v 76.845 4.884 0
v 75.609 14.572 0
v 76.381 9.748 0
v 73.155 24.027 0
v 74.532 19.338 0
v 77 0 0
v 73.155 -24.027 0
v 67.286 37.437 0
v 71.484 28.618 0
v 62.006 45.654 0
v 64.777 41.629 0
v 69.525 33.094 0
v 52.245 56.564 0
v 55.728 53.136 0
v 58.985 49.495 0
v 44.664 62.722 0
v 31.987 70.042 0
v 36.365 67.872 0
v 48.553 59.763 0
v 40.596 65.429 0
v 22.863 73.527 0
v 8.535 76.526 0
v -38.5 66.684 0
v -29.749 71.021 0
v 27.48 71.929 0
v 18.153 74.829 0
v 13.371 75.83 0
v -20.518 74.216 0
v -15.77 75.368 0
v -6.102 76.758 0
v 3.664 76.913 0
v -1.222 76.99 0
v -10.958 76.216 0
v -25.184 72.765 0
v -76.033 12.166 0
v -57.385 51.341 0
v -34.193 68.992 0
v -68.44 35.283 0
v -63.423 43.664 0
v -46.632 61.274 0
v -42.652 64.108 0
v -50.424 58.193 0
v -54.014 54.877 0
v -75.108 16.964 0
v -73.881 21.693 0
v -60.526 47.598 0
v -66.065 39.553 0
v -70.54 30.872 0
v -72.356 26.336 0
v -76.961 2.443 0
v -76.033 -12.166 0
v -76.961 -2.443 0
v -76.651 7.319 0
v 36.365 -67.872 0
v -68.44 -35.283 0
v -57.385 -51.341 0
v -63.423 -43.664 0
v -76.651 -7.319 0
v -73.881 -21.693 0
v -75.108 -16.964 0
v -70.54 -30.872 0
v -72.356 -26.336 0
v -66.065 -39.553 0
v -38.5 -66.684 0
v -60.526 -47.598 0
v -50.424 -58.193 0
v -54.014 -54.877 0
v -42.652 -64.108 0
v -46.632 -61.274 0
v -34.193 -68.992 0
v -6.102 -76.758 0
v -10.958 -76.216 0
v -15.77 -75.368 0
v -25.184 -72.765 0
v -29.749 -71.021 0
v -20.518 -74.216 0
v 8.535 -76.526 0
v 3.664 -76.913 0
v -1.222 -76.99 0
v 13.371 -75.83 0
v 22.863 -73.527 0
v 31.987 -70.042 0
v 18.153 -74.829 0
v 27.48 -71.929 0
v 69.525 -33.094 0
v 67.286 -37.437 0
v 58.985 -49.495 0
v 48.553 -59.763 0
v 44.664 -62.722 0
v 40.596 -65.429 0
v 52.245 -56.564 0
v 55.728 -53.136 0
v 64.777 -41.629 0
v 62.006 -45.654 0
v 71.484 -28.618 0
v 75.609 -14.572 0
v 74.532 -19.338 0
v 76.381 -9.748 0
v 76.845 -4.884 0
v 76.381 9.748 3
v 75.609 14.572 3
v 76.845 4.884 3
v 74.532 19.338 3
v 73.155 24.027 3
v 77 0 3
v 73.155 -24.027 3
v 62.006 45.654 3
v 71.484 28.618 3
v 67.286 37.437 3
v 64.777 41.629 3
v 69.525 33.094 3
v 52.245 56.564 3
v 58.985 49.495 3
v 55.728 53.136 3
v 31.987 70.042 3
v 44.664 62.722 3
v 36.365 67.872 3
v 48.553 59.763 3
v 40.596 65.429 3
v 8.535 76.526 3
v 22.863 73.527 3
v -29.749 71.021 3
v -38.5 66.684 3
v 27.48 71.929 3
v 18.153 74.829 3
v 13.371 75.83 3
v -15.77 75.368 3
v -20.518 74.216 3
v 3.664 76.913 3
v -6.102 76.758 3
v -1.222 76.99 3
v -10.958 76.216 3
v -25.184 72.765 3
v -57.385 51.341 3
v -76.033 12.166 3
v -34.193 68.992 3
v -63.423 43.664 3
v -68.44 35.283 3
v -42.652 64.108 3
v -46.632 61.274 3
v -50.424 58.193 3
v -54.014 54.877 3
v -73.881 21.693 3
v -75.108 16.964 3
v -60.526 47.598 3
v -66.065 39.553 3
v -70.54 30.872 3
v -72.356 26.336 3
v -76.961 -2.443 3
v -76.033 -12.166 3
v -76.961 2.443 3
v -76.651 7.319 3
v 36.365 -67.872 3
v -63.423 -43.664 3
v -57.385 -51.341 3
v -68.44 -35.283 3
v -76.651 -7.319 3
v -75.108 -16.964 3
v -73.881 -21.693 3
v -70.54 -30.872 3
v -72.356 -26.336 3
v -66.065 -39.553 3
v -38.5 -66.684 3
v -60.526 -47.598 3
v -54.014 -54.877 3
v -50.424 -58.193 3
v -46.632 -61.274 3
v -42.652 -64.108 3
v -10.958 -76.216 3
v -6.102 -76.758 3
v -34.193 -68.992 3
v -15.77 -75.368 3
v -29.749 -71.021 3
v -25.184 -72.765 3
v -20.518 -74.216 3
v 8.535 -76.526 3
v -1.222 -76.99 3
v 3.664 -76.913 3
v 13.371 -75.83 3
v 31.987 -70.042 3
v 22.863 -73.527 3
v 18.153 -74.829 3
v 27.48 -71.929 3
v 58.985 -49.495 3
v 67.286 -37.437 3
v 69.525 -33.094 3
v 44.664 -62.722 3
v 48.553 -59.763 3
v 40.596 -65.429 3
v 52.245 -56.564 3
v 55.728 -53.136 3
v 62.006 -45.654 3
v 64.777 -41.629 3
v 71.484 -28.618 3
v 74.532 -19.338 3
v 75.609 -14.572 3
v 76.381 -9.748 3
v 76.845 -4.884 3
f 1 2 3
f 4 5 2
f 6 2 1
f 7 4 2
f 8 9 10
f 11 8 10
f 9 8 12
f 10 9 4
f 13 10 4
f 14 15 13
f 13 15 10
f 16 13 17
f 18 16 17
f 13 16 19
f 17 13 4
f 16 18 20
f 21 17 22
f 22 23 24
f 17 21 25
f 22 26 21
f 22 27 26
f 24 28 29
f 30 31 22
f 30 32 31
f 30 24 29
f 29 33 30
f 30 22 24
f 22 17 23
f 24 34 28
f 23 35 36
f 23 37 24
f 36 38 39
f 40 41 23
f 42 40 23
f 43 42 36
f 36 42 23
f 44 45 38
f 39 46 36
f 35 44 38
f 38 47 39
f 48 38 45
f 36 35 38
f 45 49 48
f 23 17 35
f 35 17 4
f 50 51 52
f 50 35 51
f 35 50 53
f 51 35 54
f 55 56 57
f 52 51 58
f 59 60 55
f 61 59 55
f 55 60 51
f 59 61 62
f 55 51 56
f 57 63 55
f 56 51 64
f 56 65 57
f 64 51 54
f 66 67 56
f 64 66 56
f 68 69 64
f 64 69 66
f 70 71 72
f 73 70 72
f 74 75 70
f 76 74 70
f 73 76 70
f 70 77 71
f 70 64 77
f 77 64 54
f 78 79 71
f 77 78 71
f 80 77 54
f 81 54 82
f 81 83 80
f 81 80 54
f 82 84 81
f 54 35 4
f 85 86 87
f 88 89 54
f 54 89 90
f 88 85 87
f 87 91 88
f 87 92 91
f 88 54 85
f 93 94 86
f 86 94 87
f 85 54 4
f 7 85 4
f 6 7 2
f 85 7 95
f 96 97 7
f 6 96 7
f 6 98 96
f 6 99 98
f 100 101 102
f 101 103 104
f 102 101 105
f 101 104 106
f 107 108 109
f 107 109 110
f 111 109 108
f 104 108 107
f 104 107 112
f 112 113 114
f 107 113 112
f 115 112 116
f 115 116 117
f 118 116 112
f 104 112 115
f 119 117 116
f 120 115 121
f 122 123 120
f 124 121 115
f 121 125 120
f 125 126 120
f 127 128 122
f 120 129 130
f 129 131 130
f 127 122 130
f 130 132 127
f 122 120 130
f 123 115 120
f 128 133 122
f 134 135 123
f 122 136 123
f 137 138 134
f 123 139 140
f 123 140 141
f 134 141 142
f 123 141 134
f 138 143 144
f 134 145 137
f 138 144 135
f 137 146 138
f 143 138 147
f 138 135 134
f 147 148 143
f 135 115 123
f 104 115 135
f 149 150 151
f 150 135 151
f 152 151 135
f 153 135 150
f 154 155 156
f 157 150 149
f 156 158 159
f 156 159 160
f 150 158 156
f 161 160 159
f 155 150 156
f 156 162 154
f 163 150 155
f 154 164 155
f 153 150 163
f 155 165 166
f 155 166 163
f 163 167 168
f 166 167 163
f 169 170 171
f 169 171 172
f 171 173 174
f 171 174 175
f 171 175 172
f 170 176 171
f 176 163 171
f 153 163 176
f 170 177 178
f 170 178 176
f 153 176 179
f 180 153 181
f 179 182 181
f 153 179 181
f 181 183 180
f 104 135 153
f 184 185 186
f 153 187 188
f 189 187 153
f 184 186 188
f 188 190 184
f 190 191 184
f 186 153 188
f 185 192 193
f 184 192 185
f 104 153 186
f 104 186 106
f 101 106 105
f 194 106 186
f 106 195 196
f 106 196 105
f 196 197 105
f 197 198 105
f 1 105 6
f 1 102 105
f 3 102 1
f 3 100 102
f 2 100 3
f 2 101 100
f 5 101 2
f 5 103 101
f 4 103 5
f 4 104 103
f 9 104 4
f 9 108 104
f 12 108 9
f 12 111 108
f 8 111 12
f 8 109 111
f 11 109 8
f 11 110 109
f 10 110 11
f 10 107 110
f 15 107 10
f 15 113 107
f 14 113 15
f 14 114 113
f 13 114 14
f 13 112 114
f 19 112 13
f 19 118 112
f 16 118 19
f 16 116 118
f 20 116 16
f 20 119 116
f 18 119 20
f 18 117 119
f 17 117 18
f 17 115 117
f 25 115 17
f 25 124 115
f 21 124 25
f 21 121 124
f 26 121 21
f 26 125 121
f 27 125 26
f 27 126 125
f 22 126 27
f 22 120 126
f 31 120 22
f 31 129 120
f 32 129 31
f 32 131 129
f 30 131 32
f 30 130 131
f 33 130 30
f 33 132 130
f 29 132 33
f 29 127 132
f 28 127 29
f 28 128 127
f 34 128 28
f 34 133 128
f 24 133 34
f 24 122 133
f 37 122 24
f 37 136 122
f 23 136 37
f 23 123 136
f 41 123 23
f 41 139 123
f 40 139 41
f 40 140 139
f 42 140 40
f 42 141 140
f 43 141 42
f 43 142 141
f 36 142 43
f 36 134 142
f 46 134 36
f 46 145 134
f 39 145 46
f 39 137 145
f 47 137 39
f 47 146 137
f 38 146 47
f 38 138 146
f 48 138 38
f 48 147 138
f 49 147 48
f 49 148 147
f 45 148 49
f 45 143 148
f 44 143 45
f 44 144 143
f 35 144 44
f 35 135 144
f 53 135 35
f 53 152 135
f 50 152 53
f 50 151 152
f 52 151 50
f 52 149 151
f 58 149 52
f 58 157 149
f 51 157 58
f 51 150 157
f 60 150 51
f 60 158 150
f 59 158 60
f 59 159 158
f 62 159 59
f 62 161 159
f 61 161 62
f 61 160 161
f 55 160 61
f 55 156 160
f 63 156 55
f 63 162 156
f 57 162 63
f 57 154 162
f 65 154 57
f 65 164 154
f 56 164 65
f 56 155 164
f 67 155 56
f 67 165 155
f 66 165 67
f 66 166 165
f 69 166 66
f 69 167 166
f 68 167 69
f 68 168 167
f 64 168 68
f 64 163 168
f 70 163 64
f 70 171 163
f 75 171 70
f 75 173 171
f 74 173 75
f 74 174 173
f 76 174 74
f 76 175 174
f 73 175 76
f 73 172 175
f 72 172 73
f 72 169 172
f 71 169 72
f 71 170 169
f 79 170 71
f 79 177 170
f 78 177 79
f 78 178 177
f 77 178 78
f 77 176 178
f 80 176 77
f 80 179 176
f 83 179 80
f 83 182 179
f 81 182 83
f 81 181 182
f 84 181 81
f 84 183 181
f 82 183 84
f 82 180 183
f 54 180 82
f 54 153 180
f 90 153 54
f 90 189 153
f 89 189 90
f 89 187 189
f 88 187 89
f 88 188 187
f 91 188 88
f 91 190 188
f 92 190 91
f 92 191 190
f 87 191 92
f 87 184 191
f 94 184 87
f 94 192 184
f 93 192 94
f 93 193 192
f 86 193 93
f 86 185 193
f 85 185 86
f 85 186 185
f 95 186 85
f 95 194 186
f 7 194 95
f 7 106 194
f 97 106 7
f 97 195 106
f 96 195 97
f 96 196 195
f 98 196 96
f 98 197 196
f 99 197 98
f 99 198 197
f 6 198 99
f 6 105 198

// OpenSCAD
//// Impossible (not really) Ring with lots of features and options.
//
// TODO:
//
// - Either top and bottom sizes, or array (to allow for in/out taper)
//
// - Magnet option chooser (add model numbers):
//   - Small
//	 - Medium
//   - Large
//   - Custom
// - Separator shape
//
// - Related way to create a "wall"
// - Related way to create rounded rectangle
//
// Some useful presets:
// * Ring that fits a soda can: 5, 45, 45, 10, 3, 22, 16
//
// * Small diametric magnet: 14.0, 3.5, 2.0, 0.8 -- for _RingInset = 12
// * Large diametric magnet: 14.0, 7.0, 2.0, 0.8 -- for _RingInset = 19
//
// The [Extruders] parameters work as follows:
//
//	* WhichExtruder controls on-screen and STL rendering. Set it to All while
//	  designing. To render STL, set it successively to 1, 2, 3, 4, and 5 then
//	  render (F6) and save (F7) to numbered files (perhaps append "_1", "_2",
//	  and so forth to the base names. 
//
//	* BaseExtruder sets the extruder for the round or semicircular base.
//
//	* RingExtruder sets the extruder for the rings.
//
//	* SeparatorExtruders sets the extruder(s) for the vertical separators 
//    between the rings.
//
//  * SeparatorExtruderMode sets the extruder selection mode:
//
//		Horizontal - Each row of the ring has a single extruder setting, cycling through
//	    the list of SeparatorExtruder values.
//
//		Vertical - Each column of separators has a single extruder setting, cycling
//	    through the list fo SeparatorExtruder values.
//
// BUGS:
//
// * Expanding rings (wider at top than bottom), the separators are one Z level too low. Tilt is 
//   miscalculated when the triangle is pointing out, perhaps subtract 180? This is currently
//   disabled via an assert.
//
// * The inner edge of tilted separators hangs out a bit to the inside of each ring, 
//   causing printing problems. Perhaps render the entire thing and subtract the space inside of 
//   each ring to clear it (except first one if there's a solid bottom). Or, flatten out the 
//   inside part of each separator.
//
// TO TEST / IMPLEMENT:
//
// * Full expanding rings
// * Partial expanding rings
// * Full contracting rings
// * Partial contracting rings
// * Vertical (same size top and bottom) rings
//

// Ring count
_LayerCount = 1;

// Bottom ring radius
_BottomRingRadius = 77;

// Top ring radius
_TopRingRadius = 47;

// Ring inset
_RingInset = 14;

// Ring thickness
_RingThickness = 3;

// Separator height
_SeparatorHeight = 30;

// Separator count
_SeparatorCount = 16;

/* [Options] */

// Solid base
_SolidBase = true;

// Partial ring
_PartialRing = false;

// Magnet slots
_MagnetSlots = false;

/* [Partial] */

// Starting degrees
_StartRing = 0;

// Ending degrees
_EndRing = 360;

/* [Magnets] */

// Magnet angles
_MagnetAngles = [0, 0, 0, 0];

// Slot height
_MagnetSlotHeight = 14.0;

// Slot width/depth
_MagnetWidthDepth = 7; // 3.5;

// Height above base of separator
_MagnetHeight = 2.0;

// Inset from mid-point of separator
_MagnetInset = 0.8;

/* [Extruders] */

// Extruder to render
_WhichExtruder = "All"; // ["All", 1, 2, 3, 4, 5]

// Base extruder
_BaseExtruder = 1; 			// [1, 2, 3, 4, 5]

// Ring extruder
_RingExtruder = 1;			// [1, 2, 3, 4, 5]

// Separator extruder mode
_SeparatorExtruderMode = "Horizontal";	// [Horizontal, Vertical]

// Separator extruder 1
_SeparatorExtruder1 = true;

// Separator extruder 2
_SeparatorExtruder2 = true;

// Separator extruder 3
_SeparatorExtruder3 = true;

// Separator extruder 4
_SeparatorExtruder4 = true;

// Separator extruder 5
_SeparatorExtruder5 = true;

// Sanity checks
assert(_SeparatorHeight > (_MagnetHeight + _MagnetSlotHeight), "Magnet too tall");
assert(_TopRingRadius <= _BottomRingRadius, "Expanding rings don't work");

// Create _SeparatorExtruders vector from individual values, then use it to create _SeparatorExtruders
_SeparatorExtrudersVec = [false, _SeparatorExtruder1, _SeparatorExtruder2, _SeparatorExtruder3, _SeparatorExtruder4, _SeparatorExtruder5];
_SeparatorExtruders    = [for (i = [0 : 5]) if (_SeparatorExtrudersVec[i]) i];

// Map row and column of separator into an extruder, based on _SeparatorExtruderMode
function PickSeparatorExtruder(Row, Col) =
 (_SeparatorExtruderMode == "Horizontal") ? _SeparatorExtruders[floor(Row % len(_SeparatorExtruders))] :
 (_SeparatorExtruderMode == "Vertical")   ? _SeparatorExtruders[floor(Col % len(_SeparatorExtruders))] : 
 -1;	// Illegal value for _SeparatorExtruderMode

// Map a value of _WhichExtruder to an OpenSCAD color
function ExtruderColor(Extruder) = 
  (Extruder == 1  ) ? "red"    : 
  (Extruder == 2  ) ? "green"  : 
  (Extruder == 3  ) ? "blue"   : 
  (Extruder == 4  ) ? "pink"   :
  (Extruder == 5  ) ? "yellow" :
                      "purple" ;
					  
// If _WhichExtruder is "All" or is not "All" and matches the requested extruder, render 
// the child nodes.

module Extruder(DoExtruder)
{
	color(ExtruderColor(DoExtruder))
	{
		if (_WhichExtruder == "All" || DoExtruder == _WhichExtruder)
		{
			children();
		}
	}
}

// Render a ring
module RenderRing(Radius, Inset, Thickness)
{
	linear_extrude(Thickness)
	{
		difference()
		{
			circle(r=Radius, $fn=99);
			
			if (Inset != 0)
			{
				circle(r=Radius - Inset, $fn=99);
			}
		}
	}
}

// Render a single separator
//	Height is the vertical spacing between rings
//	Length is the commputed length of the separator, taking tilt in to account
//
module RenderSeparator(Extruder, Radius, Height, Length)
{
	Extruder(Extruder)
	{
		linear_extrude(Length)
		{
			circle(r=Radius, $fn=99);
		}
	}
}

// Render a magnet hole centered horizontally within a separator of size SeparatorRadius
module RenderMagnetHole(SeparatorRadius, SlotHeight, WidthDepth, Height, Inset)
{
	translate([0, Inset + WidthDepth / 2, Height + SlotHeight / 2])
	{
		cube([WidthDepth, WidthDepth, SlotHeight], center=true);
	}
}

// Render a single separator with a magnet hole
module RenderSeparatorWithMagnetHole(Extruder, Radius, Height, MagnetSlotHeight, MagnetWidthDepth, MagnetHeight, MagnetInset)
{
	difference()
	{
		// Matter
		RenderSeparator(Extruder, Radius, Height);
		
		// Anti-matter
		RenderMagnetHole(Radius, MagnetSlotHeight, MagnetWidthDepth, MagnetHeight, MagnetInset);
	}
}

// Render entire ring of separators with optional magnet holes at the specified angles
module RenderSeparators(Row, Count, Radius, RingThickness, Inset, Height, Length, Tilt, MagnetSlots, MagnetAngles, MagnetSlotHeight, MagnetWidthDepth, MagnetHeight, MagnetInset)
{
	for (Col = [0 : Count - 1])
	{
		Theta  = Col * 360 / Count;
		PointX = cos(Theta) * (Radius - (Inset / 2));
		PointY = sin(Theta) * (Radius - (Inset / 2));
		
		Extruder = PickSeparatorExtruder(Row, Col);
		
		translate([PointX, PointY, -RingThickness])
		{
			MagnetHere = MagnetSlots && (len(search(Theta, MagnetAngles)) > 0);
					
			// Handle separators with and without magnets separately	
			if (MagnetHere)
			{
				echo("Need a magnet at ", Theta);
				
				// Does not work for 270, but 90 and 180 are the most important cases
				SeparatorRotate = (Theta == 90)  ? -90 : 
				                  (Theta == 180) ? 180 : 0;

				rotate([0, -Tilt, Theta])
				{
					rotate([0, 0, SeparatorRotate])
					{
						RenderSeparatorWithMagnetHole(Extruder, Inset / 2, Length, MagnetSlotHeight, MagnetWidthDepth, MagnetHeight, MagnetInset);
					}
				}
			}
			else
			{
				rotate([0, -Tilt, Theta])
				{
					RenderSeparator(Extruder, Inset / 2, Height, Length);
				}
			}
		}
	}
}

//
// Render entire ring of separators inside of a clipping box. 
// The box removes the parts of the separator that extend above or below the rings.
//
module RenderSeparatorsInBox(Row, Count, Radius, RingThickness, Inset, Height, Length, Tilt, MagnetSlots, MagnetAngles, MagnetSlotHeight, MagnetWidthDepth, MagnetHeight, MagnetInset)
{
	intersection()
	{
		// Separators
		RenderSeparators(Row, Count, Radius, RingThickness, Inset, Height, Length + RingThickness, Tilt, MagnetSlots, MagnetAngles, MagnetSlotHeight, MagnetWidthDepth, MagnetHeight, MagnetInset);
		
		// Box
		translate([-Radius, -Radius, 0])
		{
			cube([2 * Radius, 2 * Radius, Height], center=false);
		}
	}
		
}

// Render entire column of rings and separators, with optional magnet holes in separator, for the separators listed in MagnetAngles
module RenderColumn(BottomRingRadius, TopRingRadius, RingInset, SolidBase, LayerCount, RingThickness, SeparatorCount, SeparatorHeight, MagnetSlots, MagnetAngles, MagnetSlotHeight, MagnetWidthDepth, MagnetHeight, MagnetInset)
{
	// Render first ring
	Extruder(_BaseExtruder)
	{
		RenderRing(BottomRingRadius, (SolidBase ? 0 : RingInset), RingThickness);
	}
	
	// Do some math
	LayerHeight = RingThickness + SeparatorHeight;
	RingRadiusStep = (TopRingRadius - BottomRingRadius) / (LayerCount - 1);
	
	// Separators and subsequent ring
	for (Row = [1 : 1 : LayerCount - 1])
	{
		// Do some more math
		ThisRingRadius = BottomRingRadius + (Row * RingRadiusStep);
		LastRingRadius = ThisRingRadius - RingRadiusStep;
		
		SeparatorLength = sqrt(((ThisRingRadius - LastRingRadius) ^ 2) + (SeparatorHeight  ^ 2)) + RingThickness;
		SeparatorTilt   = 90 - atan((SeparatorHeight  + RingThickness) / (LastRingRadius - ThisRingRadius));
		
		echo("LastRingRadius=", LastRingRadius);
		echo("ThisRingRadius=", ThisRingRadius);
		echo("SeparatorLength=", SeparatorLength);
		echo("SeparatorTilt=", SeparatorTilt);
		
		translate([0, 0, (Row - 1) * LayerHeight])
		{
			translate([0, 0, RingThickness])
			{
				RenderSeparatorsInBox(Row, SeparatorCount, ThisRingRadius - RingRadiusStep, RingThickness, RingInset, SeparatorHeight, SeparatorLength, SeparatorTilt, MagnetSlots, MagnetAngles, MagnetSlotHeight, MagnetWidthDepth, MagnetHeight, MagnetInset);
			}
			
			translate([0, 0, RingThickness + SeparatorHeight])
			{
				Extruder(_RingExtruder)
				{
					RenderRing(ThisRingRadius, RingInset, RingThickness);
				}
			}
		}
	}
}

// Render a cheese wedge that keeps only the selected part of the column
// This is used as negative space and as such is slightly larger than necessary
module RenderCheese(BottomRadius, TopRadius, Height, StartRing, EndRing)
{
	Radius2 = 1.2 * max(BottomRadius, TopRadius); // Hack
	
	linear_extrude(Height)
	{
		Points = 
		[
			[0, 0], 
			for (Theta = [StartRing : $fa : EndRing - 1]) 
				[Radius2 * cos(Theta), Radius2 * sin(Theta)],
			[Radius2 * cos(EndRing), Radius2 * sin(EndRing)]
		];
		
		polygon(Points);
	}
}

module main()
{
	ColumnHeight = ((_LayerCount - 1) * _SeparatorHeight) + (_LayerCount * _RingThickness);
	echo("Column Height = ", ColumnHeight);

	// Compute center-to-center distance between two adjacent separators
	X1 = _BottomRingRadius * cos(0);
	Y1 = _BottomRingRadius * sin(0);
	X2 = _BottomRingRadius * cos(360 / _SeparatorCount);
	Y2 = _BottomRingRadius * sin(360 / _SeparatorCount);

	SeparatorDistance = sqrt((X2 - X1) ^ 2 + (Y2 - Y1) ^ 2);
	echo("SeparatorDistance = ", SeparatorDistance);
	
	if (_PartialRing)
	{
		intersection()
		{
			RenderColumn(_BottomRingRadius, _TopRingRadius, _RingInset, _SolidBase, _LayerCount, _RingThickness, _SeparatorCount,  _SeparatorHeight, _MagnetSlots, _MagnetAngles, _MagnetSlotHeight, _MagnetWidthDepth, _MagnetHeight, _MagnetInset);
			RenderCheese(_BottomRingRadius, _TopRingRadius, ColumnHeight, _StartRing, _EndRing);
		}
	}
	else
	{
		RenderColumn(_BottomRingRadius, _TopRingRadius, _RingInset, _SolidBase, _LayerCount, _RingThickness, _SeparatorCount,  _SeparatorHeight, false, [], 0, 0, 0, 0);
	}
}

main();
